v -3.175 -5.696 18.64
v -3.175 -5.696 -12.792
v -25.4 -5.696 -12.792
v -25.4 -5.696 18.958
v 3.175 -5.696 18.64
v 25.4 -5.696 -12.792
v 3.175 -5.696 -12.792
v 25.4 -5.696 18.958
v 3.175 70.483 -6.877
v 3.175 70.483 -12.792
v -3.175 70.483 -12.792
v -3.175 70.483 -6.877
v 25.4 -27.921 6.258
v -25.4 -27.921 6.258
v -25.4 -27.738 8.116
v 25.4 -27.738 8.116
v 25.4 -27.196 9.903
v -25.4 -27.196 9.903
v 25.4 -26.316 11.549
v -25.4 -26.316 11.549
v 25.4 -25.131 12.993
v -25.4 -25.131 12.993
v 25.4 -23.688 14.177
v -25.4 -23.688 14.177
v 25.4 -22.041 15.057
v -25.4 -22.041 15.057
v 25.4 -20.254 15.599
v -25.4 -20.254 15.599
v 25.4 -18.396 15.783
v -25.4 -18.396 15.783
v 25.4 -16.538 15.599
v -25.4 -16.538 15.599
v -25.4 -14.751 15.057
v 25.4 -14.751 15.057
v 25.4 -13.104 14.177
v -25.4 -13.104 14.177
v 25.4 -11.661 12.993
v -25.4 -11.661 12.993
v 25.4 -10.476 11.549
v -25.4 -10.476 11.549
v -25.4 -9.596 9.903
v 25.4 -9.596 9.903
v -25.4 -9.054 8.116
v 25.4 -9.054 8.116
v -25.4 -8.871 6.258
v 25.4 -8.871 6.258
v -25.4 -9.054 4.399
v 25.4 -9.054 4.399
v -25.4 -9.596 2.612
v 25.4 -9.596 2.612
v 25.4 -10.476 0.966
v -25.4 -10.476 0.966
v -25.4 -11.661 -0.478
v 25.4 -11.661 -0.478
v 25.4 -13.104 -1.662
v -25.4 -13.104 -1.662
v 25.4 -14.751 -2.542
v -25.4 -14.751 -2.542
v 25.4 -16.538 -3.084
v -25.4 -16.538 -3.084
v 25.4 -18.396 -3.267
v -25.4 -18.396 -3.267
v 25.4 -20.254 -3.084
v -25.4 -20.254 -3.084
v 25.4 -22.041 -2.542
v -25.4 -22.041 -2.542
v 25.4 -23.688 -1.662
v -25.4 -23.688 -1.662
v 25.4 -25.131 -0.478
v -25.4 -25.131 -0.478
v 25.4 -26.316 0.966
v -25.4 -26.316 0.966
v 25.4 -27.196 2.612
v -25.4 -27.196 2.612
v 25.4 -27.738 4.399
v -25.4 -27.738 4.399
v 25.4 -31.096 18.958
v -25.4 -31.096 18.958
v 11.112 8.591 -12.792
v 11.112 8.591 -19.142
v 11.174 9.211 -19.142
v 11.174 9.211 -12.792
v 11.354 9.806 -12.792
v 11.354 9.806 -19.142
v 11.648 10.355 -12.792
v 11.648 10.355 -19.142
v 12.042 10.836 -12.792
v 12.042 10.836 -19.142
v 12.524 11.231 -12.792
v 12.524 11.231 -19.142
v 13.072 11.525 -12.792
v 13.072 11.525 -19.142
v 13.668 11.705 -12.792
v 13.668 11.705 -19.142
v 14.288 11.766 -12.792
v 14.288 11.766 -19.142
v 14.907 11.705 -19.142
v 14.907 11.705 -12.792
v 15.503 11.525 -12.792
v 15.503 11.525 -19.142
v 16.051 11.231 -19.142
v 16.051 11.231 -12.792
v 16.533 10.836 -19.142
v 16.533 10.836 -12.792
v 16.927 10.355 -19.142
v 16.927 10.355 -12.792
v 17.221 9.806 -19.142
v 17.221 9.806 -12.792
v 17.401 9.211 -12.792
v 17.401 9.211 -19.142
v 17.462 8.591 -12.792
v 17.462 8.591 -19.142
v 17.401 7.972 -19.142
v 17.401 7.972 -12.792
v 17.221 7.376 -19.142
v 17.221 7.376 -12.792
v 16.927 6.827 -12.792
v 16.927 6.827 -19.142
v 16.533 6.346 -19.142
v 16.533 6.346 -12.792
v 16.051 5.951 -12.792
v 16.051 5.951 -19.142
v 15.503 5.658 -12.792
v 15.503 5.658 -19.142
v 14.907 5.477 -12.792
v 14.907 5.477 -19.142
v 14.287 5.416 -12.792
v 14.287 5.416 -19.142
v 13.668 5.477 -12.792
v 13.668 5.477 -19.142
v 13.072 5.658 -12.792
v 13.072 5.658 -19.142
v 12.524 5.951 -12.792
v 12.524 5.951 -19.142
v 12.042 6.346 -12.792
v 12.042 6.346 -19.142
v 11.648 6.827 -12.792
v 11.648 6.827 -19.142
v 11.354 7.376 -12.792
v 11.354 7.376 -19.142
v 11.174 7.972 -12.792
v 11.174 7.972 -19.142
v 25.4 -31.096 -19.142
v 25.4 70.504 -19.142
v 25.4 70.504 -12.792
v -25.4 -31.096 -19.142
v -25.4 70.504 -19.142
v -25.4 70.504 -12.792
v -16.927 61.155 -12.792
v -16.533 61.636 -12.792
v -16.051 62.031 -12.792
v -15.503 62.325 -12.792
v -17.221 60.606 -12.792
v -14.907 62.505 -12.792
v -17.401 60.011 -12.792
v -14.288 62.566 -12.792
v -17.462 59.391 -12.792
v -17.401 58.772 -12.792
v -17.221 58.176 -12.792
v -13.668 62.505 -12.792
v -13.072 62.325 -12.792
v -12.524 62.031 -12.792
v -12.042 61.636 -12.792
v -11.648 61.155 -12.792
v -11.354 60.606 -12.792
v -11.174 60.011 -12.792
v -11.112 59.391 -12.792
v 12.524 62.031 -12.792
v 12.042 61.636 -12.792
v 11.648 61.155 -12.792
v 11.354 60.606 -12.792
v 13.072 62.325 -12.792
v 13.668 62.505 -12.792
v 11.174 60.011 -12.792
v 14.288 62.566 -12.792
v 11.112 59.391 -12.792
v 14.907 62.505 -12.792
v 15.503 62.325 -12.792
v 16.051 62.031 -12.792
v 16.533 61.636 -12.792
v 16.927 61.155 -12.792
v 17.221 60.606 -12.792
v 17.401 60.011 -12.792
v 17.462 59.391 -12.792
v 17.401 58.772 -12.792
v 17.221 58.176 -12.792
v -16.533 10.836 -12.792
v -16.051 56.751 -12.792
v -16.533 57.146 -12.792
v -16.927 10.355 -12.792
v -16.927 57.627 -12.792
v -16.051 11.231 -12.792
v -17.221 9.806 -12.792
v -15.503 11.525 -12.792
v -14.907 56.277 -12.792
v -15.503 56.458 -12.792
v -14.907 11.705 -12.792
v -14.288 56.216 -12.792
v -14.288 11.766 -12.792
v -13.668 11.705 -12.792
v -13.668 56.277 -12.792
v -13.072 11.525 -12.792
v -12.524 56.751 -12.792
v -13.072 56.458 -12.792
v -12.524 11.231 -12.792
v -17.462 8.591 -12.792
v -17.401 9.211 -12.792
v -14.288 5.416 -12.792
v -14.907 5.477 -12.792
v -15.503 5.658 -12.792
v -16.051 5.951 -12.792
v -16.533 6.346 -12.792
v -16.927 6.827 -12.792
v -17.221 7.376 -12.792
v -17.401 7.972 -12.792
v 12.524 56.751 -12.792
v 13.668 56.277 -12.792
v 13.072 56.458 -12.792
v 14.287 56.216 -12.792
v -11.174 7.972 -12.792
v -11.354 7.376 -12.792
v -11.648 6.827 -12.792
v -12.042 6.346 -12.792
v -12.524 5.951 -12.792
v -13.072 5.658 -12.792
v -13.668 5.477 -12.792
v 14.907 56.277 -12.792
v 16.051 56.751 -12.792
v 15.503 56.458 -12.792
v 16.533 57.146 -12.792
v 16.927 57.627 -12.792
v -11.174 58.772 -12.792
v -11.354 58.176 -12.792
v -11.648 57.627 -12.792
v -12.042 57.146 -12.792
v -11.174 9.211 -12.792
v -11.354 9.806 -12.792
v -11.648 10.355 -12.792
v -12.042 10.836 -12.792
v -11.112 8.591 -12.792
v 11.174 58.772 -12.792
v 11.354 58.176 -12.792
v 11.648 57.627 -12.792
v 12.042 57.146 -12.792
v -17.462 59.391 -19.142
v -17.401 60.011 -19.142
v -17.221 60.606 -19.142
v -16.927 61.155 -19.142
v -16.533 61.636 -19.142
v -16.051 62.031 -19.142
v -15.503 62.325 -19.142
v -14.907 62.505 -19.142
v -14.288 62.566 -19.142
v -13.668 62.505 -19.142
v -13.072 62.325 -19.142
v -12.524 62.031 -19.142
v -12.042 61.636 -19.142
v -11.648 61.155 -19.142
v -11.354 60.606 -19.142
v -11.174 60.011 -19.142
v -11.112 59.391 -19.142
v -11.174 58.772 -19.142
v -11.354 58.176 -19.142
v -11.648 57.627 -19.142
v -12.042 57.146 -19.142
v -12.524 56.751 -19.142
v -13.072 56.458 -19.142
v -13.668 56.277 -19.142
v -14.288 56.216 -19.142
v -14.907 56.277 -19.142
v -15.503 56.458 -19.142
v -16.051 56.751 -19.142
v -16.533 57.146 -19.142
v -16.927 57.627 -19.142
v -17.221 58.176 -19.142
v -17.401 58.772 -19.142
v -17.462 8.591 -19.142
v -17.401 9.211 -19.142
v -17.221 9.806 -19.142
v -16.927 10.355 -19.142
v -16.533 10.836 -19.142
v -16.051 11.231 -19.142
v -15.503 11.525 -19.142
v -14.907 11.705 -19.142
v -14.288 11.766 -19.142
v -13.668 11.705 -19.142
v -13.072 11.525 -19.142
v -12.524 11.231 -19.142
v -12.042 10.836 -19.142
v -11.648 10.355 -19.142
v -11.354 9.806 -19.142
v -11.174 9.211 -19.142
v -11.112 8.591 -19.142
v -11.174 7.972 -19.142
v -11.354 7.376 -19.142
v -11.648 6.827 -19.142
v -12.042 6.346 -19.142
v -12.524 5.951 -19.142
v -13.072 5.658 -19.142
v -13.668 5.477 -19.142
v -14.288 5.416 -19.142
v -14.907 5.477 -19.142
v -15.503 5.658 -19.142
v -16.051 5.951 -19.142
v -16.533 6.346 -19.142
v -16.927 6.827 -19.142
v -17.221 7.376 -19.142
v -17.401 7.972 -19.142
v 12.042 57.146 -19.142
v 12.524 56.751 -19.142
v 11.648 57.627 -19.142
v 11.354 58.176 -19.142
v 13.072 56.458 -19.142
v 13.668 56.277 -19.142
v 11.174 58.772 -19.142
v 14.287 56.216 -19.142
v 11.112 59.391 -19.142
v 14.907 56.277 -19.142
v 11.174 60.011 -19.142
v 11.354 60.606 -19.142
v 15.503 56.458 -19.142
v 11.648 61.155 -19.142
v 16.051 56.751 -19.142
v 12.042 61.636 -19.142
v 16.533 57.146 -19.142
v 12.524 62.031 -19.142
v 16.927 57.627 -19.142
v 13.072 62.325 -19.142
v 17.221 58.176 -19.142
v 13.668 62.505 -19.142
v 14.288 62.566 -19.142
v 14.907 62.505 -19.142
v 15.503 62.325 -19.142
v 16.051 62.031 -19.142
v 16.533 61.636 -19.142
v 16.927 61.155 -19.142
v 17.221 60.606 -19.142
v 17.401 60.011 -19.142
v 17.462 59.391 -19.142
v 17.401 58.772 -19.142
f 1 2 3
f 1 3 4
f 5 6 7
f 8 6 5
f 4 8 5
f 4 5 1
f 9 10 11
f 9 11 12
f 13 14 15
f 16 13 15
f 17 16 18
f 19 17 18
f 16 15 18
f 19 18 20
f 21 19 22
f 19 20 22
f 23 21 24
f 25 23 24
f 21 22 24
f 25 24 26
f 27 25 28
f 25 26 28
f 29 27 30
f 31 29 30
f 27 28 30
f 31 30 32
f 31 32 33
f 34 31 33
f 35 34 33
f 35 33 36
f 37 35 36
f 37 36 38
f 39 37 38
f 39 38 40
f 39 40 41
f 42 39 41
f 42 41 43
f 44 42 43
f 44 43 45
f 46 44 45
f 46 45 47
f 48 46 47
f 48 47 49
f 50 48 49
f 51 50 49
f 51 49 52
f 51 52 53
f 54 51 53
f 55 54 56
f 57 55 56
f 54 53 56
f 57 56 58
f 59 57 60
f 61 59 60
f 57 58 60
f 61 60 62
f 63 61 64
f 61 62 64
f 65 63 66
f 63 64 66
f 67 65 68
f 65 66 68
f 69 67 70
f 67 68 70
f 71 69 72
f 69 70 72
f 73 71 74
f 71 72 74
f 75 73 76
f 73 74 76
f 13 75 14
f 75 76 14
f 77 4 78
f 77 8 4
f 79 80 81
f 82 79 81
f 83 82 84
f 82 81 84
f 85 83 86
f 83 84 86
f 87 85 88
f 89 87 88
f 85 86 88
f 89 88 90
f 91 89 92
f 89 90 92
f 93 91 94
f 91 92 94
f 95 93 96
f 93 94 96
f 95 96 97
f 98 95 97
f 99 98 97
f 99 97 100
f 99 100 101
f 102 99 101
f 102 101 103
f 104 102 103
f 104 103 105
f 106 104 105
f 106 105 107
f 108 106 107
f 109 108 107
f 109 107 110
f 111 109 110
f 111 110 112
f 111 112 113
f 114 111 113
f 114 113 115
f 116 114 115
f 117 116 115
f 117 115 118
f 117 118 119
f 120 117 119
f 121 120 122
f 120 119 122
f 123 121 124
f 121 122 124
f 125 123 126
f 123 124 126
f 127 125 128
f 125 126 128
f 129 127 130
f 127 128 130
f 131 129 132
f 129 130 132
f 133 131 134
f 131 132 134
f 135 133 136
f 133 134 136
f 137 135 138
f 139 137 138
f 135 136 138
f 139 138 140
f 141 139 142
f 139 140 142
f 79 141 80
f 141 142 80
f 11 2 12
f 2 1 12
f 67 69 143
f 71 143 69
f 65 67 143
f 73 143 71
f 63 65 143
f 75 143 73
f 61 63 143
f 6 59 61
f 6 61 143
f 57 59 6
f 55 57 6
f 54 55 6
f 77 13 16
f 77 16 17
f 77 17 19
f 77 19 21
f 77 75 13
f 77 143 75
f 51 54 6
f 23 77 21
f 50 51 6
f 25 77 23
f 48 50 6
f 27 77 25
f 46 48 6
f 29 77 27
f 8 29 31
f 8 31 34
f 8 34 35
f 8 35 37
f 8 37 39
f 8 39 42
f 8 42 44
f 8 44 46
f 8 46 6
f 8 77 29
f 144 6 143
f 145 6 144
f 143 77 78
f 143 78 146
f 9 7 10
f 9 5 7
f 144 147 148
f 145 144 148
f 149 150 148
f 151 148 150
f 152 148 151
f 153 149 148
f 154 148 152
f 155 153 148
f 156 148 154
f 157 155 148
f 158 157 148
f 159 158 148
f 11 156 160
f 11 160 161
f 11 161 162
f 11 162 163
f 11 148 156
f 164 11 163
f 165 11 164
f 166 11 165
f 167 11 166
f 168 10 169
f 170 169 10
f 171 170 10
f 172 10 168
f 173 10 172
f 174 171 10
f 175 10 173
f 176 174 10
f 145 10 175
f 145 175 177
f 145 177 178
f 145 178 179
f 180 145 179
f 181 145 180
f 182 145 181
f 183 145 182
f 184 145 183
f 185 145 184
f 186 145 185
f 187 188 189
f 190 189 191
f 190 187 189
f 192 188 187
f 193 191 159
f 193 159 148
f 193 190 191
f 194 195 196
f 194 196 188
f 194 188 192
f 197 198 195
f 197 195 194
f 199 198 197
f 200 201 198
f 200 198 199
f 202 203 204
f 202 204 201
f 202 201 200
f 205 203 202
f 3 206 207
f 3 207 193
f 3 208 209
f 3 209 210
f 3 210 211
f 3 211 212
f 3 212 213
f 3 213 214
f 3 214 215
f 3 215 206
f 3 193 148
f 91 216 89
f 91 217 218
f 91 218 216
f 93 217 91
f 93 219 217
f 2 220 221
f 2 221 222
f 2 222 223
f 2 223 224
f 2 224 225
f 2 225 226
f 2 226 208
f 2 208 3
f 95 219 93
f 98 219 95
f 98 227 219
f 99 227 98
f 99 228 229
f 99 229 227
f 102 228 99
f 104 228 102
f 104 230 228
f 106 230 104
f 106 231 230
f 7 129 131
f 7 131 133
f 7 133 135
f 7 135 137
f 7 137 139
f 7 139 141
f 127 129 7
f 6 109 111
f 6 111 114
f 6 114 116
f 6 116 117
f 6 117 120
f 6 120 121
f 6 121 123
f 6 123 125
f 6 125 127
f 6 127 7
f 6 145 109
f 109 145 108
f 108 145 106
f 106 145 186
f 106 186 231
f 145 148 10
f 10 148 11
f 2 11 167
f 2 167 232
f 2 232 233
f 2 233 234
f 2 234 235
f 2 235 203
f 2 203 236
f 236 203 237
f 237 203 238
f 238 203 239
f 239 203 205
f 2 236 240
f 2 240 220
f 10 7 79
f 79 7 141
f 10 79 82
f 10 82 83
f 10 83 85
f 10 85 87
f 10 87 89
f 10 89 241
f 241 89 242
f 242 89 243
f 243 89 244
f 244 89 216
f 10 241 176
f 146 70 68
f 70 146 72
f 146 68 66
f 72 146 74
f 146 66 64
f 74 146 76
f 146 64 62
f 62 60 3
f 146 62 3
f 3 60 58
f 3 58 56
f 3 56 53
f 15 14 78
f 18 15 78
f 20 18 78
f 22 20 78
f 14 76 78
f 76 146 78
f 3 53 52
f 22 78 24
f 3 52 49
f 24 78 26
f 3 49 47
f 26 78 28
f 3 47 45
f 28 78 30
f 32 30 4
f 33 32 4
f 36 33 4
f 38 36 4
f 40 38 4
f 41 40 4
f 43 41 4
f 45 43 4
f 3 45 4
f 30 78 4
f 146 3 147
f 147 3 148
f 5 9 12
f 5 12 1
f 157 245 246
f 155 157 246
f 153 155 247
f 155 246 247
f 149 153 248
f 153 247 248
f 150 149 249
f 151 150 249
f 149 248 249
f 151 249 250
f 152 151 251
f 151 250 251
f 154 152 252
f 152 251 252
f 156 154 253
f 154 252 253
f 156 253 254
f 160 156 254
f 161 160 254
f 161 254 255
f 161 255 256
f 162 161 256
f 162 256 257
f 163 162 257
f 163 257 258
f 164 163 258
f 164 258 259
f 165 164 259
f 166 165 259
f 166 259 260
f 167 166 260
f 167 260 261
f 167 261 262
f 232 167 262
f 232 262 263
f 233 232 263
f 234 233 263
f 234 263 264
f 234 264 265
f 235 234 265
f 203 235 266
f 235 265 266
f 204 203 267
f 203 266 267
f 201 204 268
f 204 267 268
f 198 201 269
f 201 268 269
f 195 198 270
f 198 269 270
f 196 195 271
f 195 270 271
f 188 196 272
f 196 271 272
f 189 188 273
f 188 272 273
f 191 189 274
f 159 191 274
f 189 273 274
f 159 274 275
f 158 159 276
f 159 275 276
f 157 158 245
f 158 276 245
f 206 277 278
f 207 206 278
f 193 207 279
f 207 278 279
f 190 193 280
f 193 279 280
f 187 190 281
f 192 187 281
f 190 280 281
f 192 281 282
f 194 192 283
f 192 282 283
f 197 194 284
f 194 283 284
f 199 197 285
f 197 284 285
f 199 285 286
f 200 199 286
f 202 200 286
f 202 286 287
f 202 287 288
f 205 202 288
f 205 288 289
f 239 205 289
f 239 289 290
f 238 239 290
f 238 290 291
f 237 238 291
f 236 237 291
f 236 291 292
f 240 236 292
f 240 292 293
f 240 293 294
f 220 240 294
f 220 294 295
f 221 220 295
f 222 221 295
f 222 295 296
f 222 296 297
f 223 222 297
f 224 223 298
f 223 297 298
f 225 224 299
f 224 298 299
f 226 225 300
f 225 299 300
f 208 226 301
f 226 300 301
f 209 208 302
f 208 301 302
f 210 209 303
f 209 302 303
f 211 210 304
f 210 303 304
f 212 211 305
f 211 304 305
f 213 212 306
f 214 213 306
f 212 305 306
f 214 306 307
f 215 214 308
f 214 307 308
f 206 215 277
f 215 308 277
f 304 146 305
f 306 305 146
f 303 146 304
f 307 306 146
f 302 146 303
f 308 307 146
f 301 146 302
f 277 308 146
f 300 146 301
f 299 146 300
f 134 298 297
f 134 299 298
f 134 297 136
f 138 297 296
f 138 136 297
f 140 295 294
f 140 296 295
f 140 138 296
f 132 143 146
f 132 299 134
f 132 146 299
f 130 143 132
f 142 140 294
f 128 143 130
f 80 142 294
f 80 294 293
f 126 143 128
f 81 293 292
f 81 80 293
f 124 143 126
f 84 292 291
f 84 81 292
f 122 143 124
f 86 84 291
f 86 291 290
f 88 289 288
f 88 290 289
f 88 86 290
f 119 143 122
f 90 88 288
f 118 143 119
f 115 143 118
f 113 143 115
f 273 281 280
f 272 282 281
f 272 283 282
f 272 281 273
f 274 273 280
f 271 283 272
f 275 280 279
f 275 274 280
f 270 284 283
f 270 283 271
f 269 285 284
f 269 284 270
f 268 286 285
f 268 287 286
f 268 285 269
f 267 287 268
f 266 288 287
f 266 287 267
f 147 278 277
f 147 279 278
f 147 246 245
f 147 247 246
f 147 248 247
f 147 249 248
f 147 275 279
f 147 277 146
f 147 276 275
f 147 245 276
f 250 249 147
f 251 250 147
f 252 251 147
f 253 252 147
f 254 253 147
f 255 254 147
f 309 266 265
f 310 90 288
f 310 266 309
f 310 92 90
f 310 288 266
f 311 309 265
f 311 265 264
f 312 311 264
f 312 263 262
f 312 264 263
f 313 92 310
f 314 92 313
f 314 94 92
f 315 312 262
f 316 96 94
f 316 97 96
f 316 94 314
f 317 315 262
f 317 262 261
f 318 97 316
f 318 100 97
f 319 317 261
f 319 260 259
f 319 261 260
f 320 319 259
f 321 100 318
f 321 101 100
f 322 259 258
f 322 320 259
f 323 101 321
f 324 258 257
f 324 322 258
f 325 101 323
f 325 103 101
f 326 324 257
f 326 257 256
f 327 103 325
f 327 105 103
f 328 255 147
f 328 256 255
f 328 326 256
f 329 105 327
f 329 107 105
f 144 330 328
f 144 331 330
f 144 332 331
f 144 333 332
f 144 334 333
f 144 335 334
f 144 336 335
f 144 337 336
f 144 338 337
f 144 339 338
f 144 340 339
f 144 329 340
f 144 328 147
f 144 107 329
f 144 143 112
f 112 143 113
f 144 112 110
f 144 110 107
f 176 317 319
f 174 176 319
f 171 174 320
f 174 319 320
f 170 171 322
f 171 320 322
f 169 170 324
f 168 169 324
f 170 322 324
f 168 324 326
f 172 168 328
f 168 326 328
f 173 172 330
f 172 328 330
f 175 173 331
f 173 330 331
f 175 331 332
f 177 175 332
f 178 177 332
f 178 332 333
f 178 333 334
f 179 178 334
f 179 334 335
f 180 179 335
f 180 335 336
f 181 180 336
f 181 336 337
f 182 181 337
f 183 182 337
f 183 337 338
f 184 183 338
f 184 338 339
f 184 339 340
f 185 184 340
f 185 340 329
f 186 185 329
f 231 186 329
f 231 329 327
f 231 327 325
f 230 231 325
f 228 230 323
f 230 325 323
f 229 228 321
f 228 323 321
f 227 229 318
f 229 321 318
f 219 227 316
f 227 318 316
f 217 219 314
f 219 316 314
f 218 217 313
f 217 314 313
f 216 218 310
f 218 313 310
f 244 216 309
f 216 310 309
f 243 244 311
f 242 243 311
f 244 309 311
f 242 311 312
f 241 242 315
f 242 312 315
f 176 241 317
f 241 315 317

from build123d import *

# Parameters (mm, degrees)
F1_DEPTH      = 25.4
F1_DEPTH_BACK = 25.4
F4_DEPTH      = 3.175
F4_DEPTH_BACK = 3.175
F6_D          = 19.05
F8_D          = 6.35


with BuildPart() as f1:
    # F0 (on Right) → F1 (new body, two sides)
    with BuildSketch(Plane.YZ) as f1_sk:
        Polygon((-5.696102, 18.957503), (-31.096102, 18.957503), (-31.096102, -19.142497), (70.503898, -19.142497), (70.503898, -12.792497), (-5.696102, -12.792497), align=None)
    extrude(amount=F1_DEPTH)
    extrude(f1_sk.sketch, amount=-F1_DEPTH_BACK)

    # F3 (on Right) → F4 (join, two sides)
    with BuildSketch(Plane.YZ) as f4_sk:
        Polygon((-5.919815, -13.259767), (70.482805, -13.227087), (70.482805, -6.877087), (-5.919815, 18.714948), align=None)
    extrude(amount=F4_DEPTH)
    extrude(f4_sk.sketch, amount=-F4_DEPTH_BACK)

    # F6 (through all)
    with Locations(Plane.YZ.offset(25.4)):
        with Locations((-18.396102, 6.257503)):
            Hole(F6_D / 2)

    # F8 (through all)
    with Locations(Plane.XY.offset(-12.792497)):
        with Locations((-14.2875, 8.591398), (-14.2875, 59.391398), (14.2875, 8.591398), (14.2875, 59.391398)):
            Hole(F8_D / 2)


solid = f1.part
